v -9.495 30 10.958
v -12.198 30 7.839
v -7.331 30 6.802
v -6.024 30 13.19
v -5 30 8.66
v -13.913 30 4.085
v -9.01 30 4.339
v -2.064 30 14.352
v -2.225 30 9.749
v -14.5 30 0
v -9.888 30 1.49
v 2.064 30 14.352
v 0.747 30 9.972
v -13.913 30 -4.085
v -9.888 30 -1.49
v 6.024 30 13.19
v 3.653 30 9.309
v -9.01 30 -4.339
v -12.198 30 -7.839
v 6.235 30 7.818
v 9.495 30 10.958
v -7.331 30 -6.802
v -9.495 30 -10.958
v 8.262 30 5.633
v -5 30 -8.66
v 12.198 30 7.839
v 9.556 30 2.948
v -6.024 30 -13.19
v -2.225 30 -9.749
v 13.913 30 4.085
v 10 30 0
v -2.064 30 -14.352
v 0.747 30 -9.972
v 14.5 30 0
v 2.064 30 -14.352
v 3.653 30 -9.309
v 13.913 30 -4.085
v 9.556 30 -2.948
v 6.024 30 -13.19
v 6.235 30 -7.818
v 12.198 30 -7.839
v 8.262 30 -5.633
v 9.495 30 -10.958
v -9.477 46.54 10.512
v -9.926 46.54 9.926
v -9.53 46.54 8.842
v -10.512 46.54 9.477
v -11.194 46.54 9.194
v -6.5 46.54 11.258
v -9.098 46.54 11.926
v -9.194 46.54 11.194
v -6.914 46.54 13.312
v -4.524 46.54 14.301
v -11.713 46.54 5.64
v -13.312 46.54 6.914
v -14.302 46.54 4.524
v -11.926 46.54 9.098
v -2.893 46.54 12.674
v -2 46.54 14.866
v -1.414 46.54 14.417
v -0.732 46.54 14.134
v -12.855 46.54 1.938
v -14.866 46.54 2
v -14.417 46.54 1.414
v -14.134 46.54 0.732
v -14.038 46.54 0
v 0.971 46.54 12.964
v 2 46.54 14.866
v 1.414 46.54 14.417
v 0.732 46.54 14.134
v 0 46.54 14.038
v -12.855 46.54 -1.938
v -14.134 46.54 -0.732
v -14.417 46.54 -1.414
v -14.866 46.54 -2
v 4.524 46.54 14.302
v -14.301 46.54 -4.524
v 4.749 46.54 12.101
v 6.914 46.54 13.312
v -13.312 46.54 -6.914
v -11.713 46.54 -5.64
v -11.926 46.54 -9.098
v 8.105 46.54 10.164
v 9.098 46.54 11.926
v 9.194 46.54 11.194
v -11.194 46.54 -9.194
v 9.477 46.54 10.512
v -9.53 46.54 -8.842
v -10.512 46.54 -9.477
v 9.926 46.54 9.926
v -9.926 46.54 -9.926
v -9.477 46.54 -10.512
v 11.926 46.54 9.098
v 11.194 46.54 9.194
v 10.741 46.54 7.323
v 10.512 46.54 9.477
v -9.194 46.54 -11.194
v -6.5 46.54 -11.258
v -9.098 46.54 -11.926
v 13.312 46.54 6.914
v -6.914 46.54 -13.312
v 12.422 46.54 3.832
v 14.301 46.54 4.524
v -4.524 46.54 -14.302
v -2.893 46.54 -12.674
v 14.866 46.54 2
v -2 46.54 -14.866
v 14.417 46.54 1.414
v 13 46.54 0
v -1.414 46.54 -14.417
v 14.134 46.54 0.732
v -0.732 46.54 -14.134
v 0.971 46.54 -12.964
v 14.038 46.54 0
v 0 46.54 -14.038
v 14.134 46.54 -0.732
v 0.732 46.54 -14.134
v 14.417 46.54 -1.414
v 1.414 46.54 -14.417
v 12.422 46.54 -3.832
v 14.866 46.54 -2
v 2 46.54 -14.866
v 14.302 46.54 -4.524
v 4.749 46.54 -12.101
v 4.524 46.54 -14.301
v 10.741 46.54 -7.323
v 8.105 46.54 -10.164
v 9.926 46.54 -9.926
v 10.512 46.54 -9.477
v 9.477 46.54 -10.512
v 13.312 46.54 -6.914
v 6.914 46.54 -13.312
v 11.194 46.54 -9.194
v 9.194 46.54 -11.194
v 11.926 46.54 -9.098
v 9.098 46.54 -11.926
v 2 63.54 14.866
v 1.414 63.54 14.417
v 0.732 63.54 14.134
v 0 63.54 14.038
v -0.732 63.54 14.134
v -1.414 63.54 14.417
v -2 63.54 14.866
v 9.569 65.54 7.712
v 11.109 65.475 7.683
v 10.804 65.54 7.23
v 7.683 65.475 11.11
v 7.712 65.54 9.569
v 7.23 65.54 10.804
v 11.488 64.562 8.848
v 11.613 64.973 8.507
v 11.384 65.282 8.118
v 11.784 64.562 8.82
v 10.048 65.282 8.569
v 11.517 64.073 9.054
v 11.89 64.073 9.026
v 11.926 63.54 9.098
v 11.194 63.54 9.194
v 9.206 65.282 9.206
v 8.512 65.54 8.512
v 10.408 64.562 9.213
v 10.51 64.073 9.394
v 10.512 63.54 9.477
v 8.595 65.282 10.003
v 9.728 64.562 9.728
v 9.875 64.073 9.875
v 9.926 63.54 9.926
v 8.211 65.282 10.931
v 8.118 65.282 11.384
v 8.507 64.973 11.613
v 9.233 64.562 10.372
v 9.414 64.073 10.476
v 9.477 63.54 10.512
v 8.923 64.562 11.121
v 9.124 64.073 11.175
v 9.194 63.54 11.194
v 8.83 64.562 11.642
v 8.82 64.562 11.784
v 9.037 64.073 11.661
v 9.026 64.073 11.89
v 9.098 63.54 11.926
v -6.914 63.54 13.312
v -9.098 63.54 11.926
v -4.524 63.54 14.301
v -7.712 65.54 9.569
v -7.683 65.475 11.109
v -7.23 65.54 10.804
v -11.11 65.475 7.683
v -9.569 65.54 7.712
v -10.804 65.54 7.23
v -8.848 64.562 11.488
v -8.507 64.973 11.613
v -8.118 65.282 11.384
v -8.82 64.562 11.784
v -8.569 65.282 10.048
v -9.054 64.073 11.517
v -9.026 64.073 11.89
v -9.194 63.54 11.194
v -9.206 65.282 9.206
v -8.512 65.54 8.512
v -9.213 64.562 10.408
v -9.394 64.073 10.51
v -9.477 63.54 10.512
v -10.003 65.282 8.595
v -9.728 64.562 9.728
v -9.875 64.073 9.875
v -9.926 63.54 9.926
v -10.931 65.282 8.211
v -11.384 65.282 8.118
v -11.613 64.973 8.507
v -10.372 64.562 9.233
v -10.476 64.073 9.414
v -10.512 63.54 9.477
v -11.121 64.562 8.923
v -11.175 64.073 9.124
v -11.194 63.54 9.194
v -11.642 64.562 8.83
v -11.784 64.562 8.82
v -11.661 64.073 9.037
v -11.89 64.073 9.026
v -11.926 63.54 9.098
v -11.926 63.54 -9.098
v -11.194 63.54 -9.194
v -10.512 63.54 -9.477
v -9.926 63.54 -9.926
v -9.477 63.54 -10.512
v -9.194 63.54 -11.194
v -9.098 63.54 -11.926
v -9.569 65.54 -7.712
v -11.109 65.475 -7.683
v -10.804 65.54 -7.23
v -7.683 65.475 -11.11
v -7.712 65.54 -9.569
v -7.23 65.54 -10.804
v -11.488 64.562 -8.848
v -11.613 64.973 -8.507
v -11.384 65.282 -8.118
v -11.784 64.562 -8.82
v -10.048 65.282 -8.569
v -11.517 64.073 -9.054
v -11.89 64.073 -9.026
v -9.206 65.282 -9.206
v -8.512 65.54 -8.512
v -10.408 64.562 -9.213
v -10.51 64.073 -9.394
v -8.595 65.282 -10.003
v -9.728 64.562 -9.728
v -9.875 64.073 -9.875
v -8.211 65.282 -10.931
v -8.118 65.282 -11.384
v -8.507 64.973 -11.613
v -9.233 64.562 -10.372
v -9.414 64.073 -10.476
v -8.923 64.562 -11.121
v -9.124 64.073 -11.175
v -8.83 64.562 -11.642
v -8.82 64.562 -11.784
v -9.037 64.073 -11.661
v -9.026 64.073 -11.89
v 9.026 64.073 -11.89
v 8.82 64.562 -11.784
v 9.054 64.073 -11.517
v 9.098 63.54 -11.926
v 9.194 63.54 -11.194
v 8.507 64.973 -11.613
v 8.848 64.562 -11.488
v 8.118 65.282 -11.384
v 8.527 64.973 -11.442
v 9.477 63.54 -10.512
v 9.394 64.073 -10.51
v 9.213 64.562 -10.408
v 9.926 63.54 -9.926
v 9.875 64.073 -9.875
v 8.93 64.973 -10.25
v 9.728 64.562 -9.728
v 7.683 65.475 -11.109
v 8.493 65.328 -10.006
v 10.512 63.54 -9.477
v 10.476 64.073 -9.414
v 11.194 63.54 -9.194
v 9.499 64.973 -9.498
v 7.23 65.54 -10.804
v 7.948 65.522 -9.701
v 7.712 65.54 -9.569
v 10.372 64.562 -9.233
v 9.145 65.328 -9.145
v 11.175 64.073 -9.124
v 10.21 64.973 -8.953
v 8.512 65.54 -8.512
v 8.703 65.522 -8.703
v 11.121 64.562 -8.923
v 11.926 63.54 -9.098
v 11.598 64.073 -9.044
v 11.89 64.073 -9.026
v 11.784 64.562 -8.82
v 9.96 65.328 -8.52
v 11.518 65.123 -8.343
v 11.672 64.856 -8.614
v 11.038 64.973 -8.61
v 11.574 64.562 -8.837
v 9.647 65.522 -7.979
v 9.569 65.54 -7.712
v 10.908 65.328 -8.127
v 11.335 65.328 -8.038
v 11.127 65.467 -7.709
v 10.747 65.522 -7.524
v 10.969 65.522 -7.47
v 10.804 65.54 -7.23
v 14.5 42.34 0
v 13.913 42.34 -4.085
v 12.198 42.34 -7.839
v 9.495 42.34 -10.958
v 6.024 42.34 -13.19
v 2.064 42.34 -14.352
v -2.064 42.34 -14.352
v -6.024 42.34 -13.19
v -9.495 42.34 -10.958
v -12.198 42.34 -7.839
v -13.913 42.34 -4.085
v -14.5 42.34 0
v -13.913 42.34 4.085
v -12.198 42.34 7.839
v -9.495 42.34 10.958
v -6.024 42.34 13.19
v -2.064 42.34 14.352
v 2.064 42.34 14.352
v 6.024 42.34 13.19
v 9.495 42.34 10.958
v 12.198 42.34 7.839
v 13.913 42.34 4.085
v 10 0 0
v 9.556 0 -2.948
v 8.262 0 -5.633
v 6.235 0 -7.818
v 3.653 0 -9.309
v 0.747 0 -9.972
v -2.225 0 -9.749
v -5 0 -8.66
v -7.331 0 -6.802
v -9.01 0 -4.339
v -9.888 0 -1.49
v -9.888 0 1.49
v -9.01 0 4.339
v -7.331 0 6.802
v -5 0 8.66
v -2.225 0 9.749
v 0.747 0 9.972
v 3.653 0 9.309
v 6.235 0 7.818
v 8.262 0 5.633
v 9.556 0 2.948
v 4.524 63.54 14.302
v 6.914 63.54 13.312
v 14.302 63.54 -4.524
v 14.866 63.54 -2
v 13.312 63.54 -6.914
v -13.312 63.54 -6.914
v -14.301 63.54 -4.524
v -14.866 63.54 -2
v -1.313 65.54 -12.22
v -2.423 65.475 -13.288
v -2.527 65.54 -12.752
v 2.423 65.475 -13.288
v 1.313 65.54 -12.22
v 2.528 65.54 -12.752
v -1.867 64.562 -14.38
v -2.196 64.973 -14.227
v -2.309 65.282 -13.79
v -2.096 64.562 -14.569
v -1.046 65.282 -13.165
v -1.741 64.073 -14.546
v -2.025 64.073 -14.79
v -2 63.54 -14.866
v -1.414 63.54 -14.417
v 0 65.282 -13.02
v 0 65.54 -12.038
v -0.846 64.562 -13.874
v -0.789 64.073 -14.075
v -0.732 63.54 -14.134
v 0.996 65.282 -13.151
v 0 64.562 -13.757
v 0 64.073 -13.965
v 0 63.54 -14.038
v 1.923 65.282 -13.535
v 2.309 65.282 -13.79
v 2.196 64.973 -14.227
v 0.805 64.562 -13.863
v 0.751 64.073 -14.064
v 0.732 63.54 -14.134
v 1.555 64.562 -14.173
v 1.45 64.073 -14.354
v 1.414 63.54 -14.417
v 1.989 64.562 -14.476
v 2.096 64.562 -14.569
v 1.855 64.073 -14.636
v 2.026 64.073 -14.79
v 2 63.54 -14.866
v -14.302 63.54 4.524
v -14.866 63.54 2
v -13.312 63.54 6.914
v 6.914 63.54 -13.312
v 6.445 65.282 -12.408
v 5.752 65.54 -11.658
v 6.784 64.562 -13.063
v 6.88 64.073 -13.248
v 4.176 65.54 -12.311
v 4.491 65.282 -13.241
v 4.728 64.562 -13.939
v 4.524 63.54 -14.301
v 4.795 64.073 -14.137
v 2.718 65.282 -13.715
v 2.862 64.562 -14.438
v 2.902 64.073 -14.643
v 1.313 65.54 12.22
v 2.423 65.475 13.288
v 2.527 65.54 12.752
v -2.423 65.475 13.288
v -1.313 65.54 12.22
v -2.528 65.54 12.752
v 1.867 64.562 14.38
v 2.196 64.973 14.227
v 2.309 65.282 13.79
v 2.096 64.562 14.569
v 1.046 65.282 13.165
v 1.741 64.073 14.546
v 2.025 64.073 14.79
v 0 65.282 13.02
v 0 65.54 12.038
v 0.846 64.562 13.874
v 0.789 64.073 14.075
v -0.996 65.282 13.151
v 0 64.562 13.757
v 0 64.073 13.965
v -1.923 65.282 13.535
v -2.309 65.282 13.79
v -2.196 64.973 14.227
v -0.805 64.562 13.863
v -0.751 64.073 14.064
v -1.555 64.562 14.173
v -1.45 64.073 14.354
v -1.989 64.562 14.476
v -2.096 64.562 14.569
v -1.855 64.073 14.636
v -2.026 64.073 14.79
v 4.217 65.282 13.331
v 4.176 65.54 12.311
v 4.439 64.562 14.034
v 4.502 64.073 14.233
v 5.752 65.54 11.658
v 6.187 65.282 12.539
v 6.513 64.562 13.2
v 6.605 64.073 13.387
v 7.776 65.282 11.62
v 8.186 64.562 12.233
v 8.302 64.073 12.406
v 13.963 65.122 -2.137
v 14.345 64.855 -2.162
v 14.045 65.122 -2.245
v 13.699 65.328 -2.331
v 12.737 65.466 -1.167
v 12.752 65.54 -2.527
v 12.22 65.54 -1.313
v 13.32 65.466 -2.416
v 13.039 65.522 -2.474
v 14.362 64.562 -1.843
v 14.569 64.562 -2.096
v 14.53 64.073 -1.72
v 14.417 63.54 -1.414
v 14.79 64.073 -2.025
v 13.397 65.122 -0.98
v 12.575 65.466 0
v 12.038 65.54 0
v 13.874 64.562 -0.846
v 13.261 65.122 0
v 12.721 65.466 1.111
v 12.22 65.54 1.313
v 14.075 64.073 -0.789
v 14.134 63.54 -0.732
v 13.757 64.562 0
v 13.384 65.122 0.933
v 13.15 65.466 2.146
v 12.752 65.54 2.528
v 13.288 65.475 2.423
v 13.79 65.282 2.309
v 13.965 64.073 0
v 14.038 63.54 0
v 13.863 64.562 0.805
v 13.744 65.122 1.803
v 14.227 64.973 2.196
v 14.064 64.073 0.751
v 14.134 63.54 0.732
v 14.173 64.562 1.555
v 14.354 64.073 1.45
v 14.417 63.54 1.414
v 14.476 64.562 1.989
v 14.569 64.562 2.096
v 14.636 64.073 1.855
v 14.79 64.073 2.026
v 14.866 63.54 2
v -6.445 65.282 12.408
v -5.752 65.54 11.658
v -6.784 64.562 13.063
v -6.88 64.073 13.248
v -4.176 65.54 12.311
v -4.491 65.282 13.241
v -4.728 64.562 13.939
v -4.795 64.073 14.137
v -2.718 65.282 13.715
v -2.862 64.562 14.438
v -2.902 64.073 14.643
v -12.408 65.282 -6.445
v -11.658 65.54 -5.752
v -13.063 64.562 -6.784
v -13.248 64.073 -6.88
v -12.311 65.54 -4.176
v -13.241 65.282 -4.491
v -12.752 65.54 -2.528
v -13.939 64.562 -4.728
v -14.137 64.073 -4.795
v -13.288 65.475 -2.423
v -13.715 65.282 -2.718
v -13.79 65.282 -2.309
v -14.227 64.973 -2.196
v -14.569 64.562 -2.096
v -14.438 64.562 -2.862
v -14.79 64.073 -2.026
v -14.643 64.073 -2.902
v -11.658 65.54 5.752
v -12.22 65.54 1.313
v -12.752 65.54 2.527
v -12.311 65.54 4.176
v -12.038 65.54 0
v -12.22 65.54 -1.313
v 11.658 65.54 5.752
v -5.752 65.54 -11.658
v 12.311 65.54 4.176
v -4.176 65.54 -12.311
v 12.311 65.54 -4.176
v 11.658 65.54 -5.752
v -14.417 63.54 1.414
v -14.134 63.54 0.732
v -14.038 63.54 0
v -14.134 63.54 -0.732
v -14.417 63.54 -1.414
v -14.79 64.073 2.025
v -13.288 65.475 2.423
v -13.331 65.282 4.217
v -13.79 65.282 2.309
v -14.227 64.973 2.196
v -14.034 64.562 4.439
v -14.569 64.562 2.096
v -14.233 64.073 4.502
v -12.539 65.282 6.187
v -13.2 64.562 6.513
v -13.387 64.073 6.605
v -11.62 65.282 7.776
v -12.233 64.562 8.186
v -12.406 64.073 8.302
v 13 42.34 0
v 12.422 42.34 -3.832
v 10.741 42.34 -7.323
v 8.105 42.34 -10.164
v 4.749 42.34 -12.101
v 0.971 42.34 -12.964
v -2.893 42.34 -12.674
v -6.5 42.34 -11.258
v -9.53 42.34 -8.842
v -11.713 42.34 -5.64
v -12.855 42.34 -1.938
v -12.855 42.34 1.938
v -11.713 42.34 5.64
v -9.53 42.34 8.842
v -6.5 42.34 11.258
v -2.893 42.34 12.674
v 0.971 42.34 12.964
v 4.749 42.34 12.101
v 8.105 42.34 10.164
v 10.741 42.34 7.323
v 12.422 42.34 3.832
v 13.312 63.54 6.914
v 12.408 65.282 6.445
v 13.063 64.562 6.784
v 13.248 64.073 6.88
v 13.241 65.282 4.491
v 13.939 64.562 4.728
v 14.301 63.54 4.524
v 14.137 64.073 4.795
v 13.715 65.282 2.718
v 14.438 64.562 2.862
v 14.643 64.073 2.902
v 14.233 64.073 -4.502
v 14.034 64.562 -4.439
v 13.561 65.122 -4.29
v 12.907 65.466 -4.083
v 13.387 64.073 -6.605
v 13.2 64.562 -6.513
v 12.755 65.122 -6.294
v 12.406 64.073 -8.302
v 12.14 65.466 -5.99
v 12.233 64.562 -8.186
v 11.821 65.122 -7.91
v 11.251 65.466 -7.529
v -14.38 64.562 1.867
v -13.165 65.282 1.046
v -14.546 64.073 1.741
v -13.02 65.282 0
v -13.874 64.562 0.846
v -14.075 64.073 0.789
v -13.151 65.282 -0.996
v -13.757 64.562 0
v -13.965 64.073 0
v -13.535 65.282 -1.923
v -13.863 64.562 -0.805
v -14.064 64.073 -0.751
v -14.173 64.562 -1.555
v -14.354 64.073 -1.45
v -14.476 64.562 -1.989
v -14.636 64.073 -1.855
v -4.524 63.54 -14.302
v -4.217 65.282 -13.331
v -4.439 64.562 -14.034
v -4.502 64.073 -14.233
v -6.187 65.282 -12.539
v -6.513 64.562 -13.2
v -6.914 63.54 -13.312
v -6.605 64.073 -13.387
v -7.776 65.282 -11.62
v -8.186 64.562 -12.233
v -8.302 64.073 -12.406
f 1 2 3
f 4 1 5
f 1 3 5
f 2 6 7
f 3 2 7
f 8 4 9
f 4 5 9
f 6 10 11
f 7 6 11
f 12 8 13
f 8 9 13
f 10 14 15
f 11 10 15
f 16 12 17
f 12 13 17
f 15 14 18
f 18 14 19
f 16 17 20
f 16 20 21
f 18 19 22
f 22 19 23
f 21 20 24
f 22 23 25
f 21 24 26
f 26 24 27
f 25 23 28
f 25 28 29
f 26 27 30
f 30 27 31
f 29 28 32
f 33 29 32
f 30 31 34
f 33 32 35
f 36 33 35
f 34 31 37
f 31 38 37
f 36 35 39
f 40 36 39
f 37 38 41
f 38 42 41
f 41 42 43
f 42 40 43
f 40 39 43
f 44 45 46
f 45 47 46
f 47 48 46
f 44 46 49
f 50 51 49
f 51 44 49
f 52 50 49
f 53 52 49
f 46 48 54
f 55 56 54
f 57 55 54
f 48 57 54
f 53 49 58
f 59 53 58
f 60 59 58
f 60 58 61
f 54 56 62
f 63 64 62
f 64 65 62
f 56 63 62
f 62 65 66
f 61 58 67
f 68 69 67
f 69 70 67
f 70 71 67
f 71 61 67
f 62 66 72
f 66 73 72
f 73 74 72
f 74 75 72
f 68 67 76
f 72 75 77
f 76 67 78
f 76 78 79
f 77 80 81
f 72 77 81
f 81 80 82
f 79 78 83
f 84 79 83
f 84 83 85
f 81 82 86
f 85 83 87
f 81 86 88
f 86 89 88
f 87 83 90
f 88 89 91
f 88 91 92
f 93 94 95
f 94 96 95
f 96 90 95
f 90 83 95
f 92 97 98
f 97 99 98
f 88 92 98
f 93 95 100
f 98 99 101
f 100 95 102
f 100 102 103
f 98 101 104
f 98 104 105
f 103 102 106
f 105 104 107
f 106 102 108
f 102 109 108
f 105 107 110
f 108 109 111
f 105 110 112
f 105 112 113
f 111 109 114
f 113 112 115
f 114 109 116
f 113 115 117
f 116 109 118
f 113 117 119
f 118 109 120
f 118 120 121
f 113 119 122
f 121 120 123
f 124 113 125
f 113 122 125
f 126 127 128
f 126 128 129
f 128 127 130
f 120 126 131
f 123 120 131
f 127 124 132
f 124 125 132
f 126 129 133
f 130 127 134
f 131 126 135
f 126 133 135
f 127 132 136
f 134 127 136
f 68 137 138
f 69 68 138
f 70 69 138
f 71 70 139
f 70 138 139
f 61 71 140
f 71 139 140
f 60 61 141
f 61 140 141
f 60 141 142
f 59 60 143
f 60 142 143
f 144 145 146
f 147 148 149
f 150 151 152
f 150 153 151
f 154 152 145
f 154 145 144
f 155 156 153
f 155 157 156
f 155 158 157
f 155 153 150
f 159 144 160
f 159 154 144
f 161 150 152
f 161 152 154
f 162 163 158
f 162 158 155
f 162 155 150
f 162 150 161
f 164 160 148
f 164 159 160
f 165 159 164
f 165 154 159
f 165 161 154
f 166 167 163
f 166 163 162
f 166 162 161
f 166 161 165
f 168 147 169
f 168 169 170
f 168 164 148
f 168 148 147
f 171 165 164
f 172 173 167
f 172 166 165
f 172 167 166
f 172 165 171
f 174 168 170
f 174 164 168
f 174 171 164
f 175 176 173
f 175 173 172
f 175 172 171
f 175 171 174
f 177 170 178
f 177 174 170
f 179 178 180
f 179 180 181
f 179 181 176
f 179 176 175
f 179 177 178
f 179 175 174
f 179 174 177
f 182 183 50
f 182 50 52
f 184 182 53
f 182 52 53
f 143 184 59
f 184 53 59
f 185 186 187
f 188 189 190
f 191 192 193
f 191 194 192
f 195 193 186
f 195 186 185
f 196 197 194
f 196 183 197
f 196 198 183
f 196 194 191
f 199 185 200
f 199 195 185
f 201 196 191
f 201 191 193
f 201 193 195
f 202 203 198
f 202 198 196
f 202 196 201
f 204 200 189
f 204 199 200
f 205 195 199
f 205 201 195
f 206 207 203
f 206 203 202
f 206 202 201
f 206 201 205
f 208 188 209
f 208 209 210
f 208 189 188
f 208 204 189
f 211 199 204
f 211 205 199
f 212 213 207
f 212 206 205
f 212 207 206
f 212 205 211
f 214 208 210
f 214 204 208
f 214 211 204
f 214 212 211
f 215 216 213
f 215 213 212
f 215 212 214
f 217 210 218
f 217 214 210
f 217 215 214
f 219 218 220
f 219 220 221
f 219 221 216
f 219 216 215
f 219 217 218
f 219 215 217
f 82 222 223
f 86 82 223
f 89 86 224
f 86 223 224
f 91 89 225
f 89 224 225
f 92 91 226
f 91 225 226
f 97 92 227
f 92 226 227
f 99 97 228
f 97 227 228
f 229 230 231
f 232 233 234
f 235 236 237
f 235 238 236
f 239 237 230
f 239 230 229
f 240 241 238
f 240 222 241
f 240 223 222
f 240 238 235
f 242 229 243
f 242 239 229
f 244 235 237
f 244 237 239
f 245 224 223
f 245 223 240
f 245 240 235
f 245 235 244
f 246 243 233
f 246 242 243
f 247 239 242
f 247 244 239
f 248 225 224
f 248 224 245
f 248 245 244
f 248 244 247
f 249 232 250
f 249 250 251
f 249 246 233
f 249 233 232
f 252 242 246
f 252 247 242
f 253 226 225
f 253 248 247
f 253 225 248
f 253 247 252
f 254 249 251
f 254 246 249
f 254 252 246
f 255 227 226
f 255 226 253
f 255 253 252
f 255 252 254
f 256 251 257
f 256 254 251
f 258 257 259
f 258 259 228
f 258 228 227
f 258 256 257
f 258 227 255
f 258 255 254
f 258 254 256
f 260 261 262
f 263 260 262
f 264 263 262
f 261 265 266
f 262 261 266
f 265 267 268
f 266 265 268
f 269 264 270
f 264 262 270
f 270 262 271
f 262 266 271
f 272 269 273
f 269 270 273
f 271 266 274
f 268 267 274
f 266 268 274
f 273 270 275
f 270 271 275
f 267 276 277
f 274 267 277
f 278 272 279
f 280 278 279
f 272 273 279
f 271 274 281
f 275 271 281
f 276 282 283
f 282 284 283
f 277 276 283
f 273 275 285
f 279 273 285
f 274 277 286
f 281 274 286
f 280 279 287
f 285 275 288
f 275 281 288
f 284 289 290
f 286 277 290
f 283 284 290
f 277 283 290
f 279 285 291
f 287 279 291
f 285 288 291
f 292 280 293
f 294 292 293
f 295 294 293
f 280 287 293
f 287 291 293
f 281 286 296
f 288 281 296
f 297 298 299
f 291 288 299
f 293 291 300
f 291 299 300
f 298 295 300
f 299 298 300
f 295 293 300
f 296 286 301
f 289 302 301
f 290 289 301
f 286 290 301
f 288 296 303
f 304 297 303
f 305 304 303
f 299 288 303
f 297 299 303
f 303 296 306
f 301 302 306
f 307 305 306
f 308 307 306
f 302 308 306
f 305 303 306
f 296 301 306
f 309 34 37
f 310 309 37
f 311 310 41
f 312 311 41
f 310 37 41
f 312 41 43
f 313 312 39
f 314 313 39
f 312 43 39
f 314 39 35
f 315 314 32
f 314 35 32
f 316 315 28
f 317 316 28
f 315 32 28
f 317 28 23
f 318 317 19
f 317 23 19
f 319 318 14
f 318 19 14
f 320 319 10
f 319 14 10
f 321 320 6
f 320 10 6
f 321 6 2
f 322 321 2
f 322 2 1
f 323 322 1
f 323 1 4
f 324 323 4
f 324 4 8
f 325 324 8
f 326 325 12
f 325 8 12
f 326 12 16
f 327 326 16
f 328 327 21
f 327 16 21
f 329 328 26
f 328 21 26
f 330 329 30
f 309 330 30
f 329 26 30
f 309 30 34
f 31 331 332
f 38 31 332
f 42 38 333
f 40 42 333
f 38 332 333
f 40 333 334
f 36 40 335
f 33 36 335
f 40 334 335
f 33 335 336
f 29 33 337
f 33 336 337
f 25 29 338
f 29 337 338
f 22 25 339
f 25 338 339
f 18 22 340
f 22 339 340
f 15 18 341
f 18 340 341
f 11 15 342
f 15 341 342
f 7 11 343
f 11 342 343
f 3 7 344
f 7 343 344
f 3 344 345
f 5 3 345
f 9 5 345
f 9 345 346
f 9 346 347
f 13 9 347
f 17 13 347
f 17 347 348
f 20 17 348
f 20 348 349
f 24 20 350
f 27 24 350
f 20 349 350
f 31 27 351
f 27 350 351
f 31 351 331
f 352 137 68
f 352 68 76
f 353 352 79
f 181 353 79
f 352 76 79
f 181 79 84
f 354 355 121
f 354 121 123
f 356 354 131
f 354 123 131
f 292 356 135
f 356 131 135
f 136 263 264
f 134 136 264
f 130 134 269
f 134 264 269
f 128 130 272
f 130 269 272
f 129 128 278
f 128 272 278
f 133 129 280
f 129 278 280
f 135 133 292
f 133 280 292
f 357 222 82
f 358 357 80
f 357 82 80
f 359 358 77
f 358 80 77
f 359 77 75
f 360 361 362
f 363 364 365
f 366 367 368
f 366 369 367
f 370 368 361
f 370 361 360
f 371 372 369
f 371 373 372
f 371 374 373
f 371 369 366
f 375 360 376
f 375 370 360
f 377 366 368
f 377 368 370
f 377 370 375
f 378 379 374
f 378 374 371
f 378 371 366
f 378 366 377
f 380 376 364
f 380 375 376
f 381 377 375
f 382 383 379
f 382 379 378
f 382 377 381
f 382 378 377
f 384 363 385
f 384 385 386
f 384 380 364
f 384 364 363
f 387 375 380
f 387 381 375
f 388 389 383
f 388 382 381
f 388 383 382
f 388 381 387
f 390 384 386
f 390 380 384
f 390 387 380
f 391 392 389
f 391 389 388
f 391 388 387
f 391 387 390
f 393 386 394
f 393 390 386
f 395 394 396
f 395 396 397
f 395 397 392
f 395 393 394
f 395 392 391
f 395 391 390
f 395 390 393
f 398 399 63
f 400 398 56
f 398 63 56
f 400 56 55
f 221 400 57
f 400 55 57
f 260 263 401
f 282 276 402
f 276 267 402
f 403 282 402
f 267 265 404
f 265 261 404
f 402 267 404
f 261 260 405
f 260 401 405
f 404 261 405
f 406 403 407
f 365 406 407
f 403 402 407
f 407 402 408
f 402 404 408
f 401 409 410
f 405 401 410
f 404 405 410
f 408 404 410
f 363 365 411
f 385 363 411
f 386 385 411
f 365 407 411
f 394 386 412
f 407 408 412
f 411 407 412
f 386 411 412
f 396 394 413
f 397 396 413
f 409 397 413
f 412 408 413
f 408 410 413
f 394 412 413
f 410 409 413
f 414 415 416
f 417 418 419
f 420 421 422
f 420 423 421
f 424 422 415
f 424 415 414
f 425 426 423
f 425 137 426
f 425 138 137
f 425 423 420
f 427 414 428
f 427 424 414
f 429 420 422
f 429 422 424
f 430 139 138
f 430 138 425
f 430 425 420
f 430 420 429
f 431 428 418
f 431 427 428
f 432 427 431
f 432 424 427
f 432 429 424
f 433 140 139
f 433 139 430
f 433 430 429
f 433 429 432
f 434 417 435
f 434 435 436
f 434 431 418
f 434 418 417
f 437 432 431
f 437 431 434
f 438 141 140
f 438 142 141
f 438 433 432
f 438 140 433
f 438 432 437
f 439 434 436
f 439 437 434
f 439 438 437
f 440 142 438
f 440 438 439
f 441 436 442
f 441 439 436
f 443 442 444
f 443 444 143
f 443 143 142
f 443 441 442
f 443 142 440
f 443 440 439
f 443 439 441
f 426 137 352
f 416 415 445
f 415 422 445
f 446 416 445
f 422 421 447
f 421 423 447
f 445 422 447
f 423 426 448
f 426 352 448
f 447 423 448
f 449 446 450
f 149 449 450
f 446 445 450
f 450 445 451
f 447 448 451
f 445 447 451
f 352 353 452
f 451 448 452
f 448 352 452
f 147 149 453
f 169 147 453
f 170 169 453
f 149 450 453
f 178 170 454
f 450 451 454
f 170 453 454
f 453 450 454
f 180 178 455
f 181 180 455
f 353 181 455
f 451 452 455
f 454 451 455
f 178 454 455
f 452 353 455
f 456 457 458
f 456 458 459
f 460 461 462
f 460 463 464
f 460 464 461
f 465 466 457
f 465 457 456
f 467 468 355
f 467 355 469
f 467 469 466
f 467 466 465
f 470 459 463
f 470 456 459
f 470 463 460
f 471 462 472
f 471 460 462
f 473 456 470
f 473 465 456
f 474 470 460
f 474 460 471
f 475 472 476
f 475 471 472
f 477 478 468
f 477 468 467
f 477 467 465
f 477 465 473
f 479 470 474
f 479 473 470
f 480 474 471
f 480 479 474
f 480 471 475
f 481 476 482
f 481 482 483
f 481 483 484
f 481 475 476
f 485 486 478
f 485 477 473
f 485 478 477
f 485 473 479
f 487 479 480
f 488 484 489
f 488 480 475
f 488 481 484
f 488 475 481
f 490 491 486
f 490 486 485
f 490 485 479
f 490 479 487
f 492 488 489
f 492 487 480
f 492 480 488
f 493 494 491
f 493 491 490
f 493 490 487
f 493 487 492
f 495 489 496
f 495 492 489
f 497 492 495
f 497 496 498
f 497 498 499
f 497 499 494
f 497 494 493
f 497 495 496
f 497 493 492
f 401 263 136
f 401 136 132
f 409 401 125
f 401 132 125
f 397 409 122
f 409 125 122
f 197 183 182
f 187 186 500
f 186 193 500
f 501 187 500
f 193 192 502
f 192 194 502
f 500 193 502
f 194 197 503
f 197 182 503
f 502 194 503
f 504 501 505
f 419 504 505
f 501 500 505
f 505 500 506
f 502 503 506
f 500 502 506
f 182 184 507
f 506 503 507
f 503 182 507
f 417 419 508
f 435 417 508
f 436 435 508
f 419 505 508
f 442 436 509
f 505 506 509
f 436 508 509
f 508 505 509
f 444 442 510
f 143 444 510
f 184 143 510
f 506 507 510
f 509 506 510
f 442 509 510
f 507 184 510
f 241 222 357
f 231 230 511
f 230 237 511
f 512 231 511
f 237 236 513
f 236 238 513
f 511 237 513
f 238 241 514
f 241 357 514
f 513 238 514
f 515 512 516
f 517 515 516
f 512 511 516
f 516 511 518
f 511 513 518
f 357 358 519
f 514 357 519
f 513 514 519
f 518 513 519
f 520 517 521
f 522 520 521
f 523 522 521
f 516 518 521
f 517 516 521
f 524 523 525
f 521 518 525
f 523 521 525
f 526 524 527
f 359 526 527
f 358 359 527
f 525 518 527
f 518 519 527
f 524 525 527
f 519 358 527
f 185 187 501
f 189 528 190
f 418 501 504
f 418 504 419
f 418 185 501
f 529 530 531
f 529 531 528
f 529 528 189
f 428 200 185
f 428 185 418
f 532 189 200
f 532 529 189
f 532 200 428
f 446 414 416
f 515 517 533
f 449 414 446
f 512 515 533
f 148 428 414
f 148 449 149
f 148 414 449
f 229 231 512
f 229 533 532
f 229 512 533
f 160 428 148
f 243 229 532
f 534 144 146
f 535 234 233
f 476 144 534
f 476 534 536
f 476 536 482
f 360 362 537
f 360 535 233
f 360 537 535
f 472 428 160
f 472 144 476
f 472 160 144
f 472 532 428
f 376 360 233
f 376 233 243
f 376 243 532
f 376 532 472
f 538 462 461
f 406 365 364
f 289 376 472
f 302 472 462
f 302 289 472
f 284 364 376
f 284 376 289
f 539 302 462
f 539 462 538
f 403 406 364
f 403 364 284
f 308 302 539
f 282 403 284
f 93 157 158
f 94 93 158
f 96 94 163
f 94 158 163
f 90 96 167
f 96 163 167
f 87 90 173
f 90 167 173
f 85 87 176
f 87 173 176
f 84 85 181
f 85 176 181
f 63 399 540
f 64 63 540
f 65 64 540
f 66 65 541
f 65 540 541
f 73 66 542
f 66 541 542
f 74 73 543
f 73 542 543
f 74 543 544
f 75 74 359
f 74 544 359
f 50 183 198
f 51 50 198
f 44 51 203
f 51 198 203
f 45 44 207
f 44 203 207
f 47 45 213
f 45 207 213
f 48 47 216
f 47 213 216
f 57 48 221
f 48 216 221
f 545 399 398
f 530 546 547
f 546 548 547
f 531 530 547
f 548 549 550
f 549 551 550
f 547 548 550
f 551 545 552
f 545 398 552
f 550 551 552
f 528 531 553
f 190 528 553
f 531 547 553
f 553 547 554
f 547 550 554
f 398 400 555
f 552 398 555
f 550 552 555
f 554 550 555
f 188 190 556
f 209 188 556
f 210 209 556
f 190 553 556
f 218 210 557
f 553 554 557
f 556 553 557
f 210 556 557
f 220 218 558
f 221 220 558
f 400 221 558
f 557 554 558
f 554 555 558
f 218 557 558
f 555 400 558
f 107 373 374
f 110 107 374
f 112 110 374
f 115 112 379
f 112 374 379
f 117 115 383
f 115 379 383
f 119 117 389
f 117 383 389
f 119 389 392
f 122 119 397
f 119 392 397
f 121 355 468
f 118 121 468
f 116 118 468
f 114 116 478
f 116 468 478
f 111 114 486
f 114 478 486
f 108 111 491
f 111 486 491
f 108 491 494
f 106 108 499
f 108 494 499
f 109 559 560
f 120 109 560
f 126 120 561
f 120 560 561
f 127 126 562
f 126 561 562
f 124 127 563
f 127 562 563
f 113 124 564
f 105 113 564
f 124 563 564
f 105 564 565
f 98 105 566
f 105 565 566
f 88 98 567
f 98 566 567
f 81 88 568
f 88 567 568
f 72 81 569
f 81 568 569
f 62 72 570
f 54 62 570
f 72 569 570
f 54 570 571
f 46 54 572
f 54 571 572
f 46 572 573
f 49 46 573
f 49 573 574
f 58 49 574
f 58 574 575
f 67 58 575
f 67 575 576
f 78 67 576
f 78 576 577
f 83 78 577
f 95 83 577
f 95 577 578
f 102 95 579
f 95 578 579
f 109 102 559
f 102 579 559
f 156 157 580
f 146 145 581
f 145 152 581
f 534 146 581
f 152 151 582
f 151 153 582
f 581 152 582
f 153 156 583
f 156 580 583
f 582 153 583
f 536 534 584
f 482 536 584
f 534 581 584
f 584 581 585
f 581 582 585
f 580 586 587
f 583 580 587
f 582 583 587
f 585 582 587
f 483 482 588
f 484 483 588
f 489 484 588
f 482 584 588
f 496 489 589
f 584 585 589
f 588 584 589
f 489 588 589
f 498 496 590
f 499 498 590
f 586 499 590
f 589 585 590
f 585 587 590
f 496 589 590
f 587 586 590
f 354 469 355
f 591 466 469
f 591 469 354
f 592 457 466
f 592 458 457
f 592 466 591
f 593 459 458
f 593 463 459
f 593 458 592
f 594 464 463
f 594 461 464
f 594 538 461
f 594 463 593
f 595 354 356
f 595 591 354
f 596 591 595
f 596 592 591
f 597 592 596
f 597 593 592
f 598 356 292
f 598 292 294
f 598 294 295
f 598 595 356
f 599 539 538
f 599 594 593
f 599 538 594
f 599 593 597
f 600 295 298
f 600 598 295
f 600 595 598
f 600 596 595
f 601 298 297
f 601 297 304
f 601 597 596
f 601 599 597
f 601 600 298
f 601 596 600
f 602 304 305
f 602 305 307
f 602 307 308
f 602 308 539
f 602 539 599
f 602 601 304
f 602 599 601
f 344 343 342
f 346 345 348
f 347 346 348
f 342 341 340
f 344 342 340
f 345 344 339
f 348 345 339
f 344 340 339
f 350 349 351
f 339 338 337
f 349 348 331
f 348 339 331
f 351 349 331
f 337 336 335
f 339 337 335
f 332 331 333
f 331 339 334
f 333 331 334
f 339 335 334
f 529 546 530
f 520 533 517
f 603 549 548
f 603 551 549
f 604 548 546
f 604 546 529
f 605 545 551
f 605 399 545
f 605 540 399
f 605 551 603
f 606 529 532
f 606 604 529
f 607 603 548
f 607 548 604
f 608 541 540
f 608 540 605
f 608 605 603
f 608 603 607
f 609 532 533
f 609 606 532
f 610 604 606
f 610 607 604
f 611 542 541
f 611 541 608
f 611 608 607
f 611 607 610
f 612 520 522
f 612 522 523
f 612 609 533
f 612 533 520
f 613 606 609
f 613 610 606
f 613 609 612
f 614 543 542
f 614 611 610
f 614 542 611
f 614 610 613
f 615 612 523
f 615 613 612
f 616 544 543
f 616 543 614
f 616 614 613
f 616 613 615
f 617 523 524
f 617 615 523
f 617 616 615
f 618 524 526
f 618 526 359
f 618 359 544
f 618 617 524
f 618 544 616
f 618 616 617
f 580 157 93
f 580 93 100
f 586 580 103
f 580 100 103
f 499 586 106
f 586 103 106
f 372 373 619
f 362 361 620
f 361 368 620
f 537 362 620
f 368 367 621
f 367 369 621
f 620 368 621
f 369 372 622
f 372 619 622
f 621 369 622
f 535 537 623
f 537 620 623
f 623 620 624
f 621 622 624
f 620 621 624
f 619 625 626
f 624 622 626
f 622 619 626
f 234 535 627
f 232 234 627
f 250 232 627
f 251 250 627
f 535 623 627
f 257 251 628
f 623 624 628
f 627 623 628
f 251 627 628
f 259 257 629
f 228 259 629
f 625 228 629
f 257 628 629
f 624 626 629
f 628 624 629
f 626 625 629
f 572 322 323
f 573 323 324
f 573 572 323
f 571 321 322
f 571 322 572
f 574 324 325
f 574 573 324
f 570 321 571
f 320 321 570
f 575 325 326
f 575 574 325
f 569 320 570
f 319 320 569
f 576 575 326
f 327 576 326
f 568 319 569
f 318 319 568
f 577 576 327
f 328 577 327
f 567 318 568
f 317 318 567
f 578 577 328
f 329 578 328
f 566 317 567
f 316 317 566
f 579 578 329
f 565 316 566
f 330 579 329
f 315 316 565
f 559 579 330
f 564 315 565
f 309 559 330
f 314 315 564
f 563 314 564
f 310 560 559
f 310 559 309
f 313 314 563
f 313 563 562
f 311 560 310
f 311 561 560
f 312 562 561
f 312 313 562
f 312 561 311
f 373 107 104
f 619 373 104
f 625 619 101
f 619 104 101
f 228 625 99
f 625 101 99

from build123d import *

# Parameters (mm, degrees)
SKETCH1_R           = 10
BOSS_EXTRUDE1_DEPTH = 30
SKETCH2_R           = 14.5
BOSS_EXTRUDE2_DEPTH = 12.34
SKETCH3_R           = 13
BOSS_EXTRUDE3_DEPTH = 4.2
SKETCH4_R           = 15
BOSS_EXTRUDE4_DEPTH = 19
CUT_EXTRUDE1_DEPTH  = 19
FILLET2_R           = 2


with BuildPart() as part:
    # Sketch1 → Boss-Extrude1 (new body)
    with BuildSketch(Plane(origin=(0, 0, 0), x_dir=(1, 0, 0), z_dir=(0, 1, 0))):
        Circle(SKETCH1_R)
    extrude(amount=BOSS_EXTRUDE1_DEPTH)

    # Sketch2 → Boss-Extrude2 (add)
    with BuildSketch(Plane(origin=(0, 30, 0), x_dir=(1, 0, 0), z_dir=(0, 1, 0))):
        Circle(SKETCH2_R)
    extrude(amount=BOSS_EXTRUDE2_DEPTH)

    # Sketch3 → Boss-Extrude3 (add)
    with BuildSketch(Plane(origin=(0, 42.34, 0), x_dir=(1, 0, 0), z_dir=(0, 1, 0))):
        Circle(SKETCH3_R)
    extrude(amount=BOSS_EXTRUDE3_DEPTH)

    # Sketch4 → Boss-Extrude4 (add)
    with BuildSketch(Plane(origin=(0, 46.54, 0), x_dir=(1, 0, 0), z_dir=(0, 1, 0))):
        Circle(SKETCH4_R)
    extrude(amount=BOSS_EXTRUDE4_DEPTH)

    # Sketch5 → Cut-Extrude1 (cut)
    with BuildSketch(Plane(origin=(0, 65.54, 0), x_dir=(1, 0, 0), z_dir=(0, 1, 0))):
        with BuildLine():
            ThreePointArc((-14.866053103, 2.000116283), (-15, 5.8666e-05), (-14.866068747, -2))
            ThreePointArc((-14.866068747, -2), (-14.037575657, 5.4901e-05), (-14.866053103, 2.000116283))
        make_face()
        with BuildLine():
            ThreePointArc((-2, 14.866068747), (5.4901e-05, 14.037575657), (2.000116283, 14.866053103))
            ThreePointArc((2.000116283, 14.866053103), (5.8666e-05, 15), (-2, 14.866068747))
        make_face()
        with BuildLine():
            ThreePointArc((9.097684458, 11.926111583), (9.92610376, 9.926026117), (11.926182746, 9.097591171))
            ThreePointArc((11.926182746, 9.097591171), (10.606643201, 10.606560235), (9.097684458, 11.926111583))
        make_face()
        with BuildLine():
            ThreePointArc((14.866068747, 2), (14.037575657, -5.4901e-05), (14.866053103, -2.000116283))
            ThreePointArc((14.866053103, -2.000116283), (15, -5.8666e-05), (14.866068747, 2))
        make_face()
        with BuildLine():
            ThreePointArc((11.926111583, -9.097684458), (9.926026117, -9.92610376), (9.097591171, -11.926182746))
            ThreePointArc((9.097591171, -11.926182746), (10.606560235, -10.606643201), (11.926111583, -9.097684458))
        make_face()
        with BuildLine():
            ThreePointArc((2, -14.866068747), (-5.4901e-05, -14.037575657), (-2.000116283, -14.866053103))
            ThreePointArc((-2.000116283, -14.866053103), (-5.8666e-05, -15), (2, -14.866068747))
        make_face()
        with BuildLine():
            ThreePointArc((-9.097684458, -11.926111583), (-9.92610376, -9.926026117), (-11.926182746, -9.097591171))
            ThreePointArc((-11.926182746, -9.097591171), (-10.606643201, -10.606560235), (-9.097684458, -11.926111583))
        make_face()
        with BuildLine():
            ThreePointArc((-11.926111583, 9.097684458), (-9.926026117, 9.92610376), (-9.097591171, 11.926182746))
            ThreePointArc((-9.097591171, 11.926182746), (-10.606560235, 10.606643201), (-11.926111583, 9.097684458))
        make_face()
    extrude(amount=-CUT_EXTRUDE1_DEPTH, mode=Mode.SUBTRACT)

    # Fillet2
    fillet2_edges = [part.edges().sort_by_distance(p)[0] for p in [
        (-5.740197286, 65.54, -13.858215438),
        (5.4901e-05, 65.54, -14.037575657),
        (5.740305685, 65.54, -13.858170537),
        (9.92610376, 65.54, -9.926026117),
        (13.858215438, 65.54, -5.740197286),
        (14.037575657, 65.54, 5.4901e-05),
        (13.858170537, 65.54, 5.740305685),
        (9.926026117, 65.54, 9.92610376),
        (5.740197286, 65.54, 13.858215438),
        (-5.4901e-05, 65.54, 14.037575657),
        (-5.740305685, 65.54, 13.858170537),
        (-9.92610376, 65.54, 9.926026117),
        (-13.858215438, 65.54, 5.740197286),
        (-14.037575657, 65.54, -5.4901e-05),
        (-13.858170537, 65.54, -5.740305685),
        (-9.926026117, 65.54, -9.92610376),
    ]]
    fillet(fillet2_edges, radius=FILLET2_R)


solid = part.part
